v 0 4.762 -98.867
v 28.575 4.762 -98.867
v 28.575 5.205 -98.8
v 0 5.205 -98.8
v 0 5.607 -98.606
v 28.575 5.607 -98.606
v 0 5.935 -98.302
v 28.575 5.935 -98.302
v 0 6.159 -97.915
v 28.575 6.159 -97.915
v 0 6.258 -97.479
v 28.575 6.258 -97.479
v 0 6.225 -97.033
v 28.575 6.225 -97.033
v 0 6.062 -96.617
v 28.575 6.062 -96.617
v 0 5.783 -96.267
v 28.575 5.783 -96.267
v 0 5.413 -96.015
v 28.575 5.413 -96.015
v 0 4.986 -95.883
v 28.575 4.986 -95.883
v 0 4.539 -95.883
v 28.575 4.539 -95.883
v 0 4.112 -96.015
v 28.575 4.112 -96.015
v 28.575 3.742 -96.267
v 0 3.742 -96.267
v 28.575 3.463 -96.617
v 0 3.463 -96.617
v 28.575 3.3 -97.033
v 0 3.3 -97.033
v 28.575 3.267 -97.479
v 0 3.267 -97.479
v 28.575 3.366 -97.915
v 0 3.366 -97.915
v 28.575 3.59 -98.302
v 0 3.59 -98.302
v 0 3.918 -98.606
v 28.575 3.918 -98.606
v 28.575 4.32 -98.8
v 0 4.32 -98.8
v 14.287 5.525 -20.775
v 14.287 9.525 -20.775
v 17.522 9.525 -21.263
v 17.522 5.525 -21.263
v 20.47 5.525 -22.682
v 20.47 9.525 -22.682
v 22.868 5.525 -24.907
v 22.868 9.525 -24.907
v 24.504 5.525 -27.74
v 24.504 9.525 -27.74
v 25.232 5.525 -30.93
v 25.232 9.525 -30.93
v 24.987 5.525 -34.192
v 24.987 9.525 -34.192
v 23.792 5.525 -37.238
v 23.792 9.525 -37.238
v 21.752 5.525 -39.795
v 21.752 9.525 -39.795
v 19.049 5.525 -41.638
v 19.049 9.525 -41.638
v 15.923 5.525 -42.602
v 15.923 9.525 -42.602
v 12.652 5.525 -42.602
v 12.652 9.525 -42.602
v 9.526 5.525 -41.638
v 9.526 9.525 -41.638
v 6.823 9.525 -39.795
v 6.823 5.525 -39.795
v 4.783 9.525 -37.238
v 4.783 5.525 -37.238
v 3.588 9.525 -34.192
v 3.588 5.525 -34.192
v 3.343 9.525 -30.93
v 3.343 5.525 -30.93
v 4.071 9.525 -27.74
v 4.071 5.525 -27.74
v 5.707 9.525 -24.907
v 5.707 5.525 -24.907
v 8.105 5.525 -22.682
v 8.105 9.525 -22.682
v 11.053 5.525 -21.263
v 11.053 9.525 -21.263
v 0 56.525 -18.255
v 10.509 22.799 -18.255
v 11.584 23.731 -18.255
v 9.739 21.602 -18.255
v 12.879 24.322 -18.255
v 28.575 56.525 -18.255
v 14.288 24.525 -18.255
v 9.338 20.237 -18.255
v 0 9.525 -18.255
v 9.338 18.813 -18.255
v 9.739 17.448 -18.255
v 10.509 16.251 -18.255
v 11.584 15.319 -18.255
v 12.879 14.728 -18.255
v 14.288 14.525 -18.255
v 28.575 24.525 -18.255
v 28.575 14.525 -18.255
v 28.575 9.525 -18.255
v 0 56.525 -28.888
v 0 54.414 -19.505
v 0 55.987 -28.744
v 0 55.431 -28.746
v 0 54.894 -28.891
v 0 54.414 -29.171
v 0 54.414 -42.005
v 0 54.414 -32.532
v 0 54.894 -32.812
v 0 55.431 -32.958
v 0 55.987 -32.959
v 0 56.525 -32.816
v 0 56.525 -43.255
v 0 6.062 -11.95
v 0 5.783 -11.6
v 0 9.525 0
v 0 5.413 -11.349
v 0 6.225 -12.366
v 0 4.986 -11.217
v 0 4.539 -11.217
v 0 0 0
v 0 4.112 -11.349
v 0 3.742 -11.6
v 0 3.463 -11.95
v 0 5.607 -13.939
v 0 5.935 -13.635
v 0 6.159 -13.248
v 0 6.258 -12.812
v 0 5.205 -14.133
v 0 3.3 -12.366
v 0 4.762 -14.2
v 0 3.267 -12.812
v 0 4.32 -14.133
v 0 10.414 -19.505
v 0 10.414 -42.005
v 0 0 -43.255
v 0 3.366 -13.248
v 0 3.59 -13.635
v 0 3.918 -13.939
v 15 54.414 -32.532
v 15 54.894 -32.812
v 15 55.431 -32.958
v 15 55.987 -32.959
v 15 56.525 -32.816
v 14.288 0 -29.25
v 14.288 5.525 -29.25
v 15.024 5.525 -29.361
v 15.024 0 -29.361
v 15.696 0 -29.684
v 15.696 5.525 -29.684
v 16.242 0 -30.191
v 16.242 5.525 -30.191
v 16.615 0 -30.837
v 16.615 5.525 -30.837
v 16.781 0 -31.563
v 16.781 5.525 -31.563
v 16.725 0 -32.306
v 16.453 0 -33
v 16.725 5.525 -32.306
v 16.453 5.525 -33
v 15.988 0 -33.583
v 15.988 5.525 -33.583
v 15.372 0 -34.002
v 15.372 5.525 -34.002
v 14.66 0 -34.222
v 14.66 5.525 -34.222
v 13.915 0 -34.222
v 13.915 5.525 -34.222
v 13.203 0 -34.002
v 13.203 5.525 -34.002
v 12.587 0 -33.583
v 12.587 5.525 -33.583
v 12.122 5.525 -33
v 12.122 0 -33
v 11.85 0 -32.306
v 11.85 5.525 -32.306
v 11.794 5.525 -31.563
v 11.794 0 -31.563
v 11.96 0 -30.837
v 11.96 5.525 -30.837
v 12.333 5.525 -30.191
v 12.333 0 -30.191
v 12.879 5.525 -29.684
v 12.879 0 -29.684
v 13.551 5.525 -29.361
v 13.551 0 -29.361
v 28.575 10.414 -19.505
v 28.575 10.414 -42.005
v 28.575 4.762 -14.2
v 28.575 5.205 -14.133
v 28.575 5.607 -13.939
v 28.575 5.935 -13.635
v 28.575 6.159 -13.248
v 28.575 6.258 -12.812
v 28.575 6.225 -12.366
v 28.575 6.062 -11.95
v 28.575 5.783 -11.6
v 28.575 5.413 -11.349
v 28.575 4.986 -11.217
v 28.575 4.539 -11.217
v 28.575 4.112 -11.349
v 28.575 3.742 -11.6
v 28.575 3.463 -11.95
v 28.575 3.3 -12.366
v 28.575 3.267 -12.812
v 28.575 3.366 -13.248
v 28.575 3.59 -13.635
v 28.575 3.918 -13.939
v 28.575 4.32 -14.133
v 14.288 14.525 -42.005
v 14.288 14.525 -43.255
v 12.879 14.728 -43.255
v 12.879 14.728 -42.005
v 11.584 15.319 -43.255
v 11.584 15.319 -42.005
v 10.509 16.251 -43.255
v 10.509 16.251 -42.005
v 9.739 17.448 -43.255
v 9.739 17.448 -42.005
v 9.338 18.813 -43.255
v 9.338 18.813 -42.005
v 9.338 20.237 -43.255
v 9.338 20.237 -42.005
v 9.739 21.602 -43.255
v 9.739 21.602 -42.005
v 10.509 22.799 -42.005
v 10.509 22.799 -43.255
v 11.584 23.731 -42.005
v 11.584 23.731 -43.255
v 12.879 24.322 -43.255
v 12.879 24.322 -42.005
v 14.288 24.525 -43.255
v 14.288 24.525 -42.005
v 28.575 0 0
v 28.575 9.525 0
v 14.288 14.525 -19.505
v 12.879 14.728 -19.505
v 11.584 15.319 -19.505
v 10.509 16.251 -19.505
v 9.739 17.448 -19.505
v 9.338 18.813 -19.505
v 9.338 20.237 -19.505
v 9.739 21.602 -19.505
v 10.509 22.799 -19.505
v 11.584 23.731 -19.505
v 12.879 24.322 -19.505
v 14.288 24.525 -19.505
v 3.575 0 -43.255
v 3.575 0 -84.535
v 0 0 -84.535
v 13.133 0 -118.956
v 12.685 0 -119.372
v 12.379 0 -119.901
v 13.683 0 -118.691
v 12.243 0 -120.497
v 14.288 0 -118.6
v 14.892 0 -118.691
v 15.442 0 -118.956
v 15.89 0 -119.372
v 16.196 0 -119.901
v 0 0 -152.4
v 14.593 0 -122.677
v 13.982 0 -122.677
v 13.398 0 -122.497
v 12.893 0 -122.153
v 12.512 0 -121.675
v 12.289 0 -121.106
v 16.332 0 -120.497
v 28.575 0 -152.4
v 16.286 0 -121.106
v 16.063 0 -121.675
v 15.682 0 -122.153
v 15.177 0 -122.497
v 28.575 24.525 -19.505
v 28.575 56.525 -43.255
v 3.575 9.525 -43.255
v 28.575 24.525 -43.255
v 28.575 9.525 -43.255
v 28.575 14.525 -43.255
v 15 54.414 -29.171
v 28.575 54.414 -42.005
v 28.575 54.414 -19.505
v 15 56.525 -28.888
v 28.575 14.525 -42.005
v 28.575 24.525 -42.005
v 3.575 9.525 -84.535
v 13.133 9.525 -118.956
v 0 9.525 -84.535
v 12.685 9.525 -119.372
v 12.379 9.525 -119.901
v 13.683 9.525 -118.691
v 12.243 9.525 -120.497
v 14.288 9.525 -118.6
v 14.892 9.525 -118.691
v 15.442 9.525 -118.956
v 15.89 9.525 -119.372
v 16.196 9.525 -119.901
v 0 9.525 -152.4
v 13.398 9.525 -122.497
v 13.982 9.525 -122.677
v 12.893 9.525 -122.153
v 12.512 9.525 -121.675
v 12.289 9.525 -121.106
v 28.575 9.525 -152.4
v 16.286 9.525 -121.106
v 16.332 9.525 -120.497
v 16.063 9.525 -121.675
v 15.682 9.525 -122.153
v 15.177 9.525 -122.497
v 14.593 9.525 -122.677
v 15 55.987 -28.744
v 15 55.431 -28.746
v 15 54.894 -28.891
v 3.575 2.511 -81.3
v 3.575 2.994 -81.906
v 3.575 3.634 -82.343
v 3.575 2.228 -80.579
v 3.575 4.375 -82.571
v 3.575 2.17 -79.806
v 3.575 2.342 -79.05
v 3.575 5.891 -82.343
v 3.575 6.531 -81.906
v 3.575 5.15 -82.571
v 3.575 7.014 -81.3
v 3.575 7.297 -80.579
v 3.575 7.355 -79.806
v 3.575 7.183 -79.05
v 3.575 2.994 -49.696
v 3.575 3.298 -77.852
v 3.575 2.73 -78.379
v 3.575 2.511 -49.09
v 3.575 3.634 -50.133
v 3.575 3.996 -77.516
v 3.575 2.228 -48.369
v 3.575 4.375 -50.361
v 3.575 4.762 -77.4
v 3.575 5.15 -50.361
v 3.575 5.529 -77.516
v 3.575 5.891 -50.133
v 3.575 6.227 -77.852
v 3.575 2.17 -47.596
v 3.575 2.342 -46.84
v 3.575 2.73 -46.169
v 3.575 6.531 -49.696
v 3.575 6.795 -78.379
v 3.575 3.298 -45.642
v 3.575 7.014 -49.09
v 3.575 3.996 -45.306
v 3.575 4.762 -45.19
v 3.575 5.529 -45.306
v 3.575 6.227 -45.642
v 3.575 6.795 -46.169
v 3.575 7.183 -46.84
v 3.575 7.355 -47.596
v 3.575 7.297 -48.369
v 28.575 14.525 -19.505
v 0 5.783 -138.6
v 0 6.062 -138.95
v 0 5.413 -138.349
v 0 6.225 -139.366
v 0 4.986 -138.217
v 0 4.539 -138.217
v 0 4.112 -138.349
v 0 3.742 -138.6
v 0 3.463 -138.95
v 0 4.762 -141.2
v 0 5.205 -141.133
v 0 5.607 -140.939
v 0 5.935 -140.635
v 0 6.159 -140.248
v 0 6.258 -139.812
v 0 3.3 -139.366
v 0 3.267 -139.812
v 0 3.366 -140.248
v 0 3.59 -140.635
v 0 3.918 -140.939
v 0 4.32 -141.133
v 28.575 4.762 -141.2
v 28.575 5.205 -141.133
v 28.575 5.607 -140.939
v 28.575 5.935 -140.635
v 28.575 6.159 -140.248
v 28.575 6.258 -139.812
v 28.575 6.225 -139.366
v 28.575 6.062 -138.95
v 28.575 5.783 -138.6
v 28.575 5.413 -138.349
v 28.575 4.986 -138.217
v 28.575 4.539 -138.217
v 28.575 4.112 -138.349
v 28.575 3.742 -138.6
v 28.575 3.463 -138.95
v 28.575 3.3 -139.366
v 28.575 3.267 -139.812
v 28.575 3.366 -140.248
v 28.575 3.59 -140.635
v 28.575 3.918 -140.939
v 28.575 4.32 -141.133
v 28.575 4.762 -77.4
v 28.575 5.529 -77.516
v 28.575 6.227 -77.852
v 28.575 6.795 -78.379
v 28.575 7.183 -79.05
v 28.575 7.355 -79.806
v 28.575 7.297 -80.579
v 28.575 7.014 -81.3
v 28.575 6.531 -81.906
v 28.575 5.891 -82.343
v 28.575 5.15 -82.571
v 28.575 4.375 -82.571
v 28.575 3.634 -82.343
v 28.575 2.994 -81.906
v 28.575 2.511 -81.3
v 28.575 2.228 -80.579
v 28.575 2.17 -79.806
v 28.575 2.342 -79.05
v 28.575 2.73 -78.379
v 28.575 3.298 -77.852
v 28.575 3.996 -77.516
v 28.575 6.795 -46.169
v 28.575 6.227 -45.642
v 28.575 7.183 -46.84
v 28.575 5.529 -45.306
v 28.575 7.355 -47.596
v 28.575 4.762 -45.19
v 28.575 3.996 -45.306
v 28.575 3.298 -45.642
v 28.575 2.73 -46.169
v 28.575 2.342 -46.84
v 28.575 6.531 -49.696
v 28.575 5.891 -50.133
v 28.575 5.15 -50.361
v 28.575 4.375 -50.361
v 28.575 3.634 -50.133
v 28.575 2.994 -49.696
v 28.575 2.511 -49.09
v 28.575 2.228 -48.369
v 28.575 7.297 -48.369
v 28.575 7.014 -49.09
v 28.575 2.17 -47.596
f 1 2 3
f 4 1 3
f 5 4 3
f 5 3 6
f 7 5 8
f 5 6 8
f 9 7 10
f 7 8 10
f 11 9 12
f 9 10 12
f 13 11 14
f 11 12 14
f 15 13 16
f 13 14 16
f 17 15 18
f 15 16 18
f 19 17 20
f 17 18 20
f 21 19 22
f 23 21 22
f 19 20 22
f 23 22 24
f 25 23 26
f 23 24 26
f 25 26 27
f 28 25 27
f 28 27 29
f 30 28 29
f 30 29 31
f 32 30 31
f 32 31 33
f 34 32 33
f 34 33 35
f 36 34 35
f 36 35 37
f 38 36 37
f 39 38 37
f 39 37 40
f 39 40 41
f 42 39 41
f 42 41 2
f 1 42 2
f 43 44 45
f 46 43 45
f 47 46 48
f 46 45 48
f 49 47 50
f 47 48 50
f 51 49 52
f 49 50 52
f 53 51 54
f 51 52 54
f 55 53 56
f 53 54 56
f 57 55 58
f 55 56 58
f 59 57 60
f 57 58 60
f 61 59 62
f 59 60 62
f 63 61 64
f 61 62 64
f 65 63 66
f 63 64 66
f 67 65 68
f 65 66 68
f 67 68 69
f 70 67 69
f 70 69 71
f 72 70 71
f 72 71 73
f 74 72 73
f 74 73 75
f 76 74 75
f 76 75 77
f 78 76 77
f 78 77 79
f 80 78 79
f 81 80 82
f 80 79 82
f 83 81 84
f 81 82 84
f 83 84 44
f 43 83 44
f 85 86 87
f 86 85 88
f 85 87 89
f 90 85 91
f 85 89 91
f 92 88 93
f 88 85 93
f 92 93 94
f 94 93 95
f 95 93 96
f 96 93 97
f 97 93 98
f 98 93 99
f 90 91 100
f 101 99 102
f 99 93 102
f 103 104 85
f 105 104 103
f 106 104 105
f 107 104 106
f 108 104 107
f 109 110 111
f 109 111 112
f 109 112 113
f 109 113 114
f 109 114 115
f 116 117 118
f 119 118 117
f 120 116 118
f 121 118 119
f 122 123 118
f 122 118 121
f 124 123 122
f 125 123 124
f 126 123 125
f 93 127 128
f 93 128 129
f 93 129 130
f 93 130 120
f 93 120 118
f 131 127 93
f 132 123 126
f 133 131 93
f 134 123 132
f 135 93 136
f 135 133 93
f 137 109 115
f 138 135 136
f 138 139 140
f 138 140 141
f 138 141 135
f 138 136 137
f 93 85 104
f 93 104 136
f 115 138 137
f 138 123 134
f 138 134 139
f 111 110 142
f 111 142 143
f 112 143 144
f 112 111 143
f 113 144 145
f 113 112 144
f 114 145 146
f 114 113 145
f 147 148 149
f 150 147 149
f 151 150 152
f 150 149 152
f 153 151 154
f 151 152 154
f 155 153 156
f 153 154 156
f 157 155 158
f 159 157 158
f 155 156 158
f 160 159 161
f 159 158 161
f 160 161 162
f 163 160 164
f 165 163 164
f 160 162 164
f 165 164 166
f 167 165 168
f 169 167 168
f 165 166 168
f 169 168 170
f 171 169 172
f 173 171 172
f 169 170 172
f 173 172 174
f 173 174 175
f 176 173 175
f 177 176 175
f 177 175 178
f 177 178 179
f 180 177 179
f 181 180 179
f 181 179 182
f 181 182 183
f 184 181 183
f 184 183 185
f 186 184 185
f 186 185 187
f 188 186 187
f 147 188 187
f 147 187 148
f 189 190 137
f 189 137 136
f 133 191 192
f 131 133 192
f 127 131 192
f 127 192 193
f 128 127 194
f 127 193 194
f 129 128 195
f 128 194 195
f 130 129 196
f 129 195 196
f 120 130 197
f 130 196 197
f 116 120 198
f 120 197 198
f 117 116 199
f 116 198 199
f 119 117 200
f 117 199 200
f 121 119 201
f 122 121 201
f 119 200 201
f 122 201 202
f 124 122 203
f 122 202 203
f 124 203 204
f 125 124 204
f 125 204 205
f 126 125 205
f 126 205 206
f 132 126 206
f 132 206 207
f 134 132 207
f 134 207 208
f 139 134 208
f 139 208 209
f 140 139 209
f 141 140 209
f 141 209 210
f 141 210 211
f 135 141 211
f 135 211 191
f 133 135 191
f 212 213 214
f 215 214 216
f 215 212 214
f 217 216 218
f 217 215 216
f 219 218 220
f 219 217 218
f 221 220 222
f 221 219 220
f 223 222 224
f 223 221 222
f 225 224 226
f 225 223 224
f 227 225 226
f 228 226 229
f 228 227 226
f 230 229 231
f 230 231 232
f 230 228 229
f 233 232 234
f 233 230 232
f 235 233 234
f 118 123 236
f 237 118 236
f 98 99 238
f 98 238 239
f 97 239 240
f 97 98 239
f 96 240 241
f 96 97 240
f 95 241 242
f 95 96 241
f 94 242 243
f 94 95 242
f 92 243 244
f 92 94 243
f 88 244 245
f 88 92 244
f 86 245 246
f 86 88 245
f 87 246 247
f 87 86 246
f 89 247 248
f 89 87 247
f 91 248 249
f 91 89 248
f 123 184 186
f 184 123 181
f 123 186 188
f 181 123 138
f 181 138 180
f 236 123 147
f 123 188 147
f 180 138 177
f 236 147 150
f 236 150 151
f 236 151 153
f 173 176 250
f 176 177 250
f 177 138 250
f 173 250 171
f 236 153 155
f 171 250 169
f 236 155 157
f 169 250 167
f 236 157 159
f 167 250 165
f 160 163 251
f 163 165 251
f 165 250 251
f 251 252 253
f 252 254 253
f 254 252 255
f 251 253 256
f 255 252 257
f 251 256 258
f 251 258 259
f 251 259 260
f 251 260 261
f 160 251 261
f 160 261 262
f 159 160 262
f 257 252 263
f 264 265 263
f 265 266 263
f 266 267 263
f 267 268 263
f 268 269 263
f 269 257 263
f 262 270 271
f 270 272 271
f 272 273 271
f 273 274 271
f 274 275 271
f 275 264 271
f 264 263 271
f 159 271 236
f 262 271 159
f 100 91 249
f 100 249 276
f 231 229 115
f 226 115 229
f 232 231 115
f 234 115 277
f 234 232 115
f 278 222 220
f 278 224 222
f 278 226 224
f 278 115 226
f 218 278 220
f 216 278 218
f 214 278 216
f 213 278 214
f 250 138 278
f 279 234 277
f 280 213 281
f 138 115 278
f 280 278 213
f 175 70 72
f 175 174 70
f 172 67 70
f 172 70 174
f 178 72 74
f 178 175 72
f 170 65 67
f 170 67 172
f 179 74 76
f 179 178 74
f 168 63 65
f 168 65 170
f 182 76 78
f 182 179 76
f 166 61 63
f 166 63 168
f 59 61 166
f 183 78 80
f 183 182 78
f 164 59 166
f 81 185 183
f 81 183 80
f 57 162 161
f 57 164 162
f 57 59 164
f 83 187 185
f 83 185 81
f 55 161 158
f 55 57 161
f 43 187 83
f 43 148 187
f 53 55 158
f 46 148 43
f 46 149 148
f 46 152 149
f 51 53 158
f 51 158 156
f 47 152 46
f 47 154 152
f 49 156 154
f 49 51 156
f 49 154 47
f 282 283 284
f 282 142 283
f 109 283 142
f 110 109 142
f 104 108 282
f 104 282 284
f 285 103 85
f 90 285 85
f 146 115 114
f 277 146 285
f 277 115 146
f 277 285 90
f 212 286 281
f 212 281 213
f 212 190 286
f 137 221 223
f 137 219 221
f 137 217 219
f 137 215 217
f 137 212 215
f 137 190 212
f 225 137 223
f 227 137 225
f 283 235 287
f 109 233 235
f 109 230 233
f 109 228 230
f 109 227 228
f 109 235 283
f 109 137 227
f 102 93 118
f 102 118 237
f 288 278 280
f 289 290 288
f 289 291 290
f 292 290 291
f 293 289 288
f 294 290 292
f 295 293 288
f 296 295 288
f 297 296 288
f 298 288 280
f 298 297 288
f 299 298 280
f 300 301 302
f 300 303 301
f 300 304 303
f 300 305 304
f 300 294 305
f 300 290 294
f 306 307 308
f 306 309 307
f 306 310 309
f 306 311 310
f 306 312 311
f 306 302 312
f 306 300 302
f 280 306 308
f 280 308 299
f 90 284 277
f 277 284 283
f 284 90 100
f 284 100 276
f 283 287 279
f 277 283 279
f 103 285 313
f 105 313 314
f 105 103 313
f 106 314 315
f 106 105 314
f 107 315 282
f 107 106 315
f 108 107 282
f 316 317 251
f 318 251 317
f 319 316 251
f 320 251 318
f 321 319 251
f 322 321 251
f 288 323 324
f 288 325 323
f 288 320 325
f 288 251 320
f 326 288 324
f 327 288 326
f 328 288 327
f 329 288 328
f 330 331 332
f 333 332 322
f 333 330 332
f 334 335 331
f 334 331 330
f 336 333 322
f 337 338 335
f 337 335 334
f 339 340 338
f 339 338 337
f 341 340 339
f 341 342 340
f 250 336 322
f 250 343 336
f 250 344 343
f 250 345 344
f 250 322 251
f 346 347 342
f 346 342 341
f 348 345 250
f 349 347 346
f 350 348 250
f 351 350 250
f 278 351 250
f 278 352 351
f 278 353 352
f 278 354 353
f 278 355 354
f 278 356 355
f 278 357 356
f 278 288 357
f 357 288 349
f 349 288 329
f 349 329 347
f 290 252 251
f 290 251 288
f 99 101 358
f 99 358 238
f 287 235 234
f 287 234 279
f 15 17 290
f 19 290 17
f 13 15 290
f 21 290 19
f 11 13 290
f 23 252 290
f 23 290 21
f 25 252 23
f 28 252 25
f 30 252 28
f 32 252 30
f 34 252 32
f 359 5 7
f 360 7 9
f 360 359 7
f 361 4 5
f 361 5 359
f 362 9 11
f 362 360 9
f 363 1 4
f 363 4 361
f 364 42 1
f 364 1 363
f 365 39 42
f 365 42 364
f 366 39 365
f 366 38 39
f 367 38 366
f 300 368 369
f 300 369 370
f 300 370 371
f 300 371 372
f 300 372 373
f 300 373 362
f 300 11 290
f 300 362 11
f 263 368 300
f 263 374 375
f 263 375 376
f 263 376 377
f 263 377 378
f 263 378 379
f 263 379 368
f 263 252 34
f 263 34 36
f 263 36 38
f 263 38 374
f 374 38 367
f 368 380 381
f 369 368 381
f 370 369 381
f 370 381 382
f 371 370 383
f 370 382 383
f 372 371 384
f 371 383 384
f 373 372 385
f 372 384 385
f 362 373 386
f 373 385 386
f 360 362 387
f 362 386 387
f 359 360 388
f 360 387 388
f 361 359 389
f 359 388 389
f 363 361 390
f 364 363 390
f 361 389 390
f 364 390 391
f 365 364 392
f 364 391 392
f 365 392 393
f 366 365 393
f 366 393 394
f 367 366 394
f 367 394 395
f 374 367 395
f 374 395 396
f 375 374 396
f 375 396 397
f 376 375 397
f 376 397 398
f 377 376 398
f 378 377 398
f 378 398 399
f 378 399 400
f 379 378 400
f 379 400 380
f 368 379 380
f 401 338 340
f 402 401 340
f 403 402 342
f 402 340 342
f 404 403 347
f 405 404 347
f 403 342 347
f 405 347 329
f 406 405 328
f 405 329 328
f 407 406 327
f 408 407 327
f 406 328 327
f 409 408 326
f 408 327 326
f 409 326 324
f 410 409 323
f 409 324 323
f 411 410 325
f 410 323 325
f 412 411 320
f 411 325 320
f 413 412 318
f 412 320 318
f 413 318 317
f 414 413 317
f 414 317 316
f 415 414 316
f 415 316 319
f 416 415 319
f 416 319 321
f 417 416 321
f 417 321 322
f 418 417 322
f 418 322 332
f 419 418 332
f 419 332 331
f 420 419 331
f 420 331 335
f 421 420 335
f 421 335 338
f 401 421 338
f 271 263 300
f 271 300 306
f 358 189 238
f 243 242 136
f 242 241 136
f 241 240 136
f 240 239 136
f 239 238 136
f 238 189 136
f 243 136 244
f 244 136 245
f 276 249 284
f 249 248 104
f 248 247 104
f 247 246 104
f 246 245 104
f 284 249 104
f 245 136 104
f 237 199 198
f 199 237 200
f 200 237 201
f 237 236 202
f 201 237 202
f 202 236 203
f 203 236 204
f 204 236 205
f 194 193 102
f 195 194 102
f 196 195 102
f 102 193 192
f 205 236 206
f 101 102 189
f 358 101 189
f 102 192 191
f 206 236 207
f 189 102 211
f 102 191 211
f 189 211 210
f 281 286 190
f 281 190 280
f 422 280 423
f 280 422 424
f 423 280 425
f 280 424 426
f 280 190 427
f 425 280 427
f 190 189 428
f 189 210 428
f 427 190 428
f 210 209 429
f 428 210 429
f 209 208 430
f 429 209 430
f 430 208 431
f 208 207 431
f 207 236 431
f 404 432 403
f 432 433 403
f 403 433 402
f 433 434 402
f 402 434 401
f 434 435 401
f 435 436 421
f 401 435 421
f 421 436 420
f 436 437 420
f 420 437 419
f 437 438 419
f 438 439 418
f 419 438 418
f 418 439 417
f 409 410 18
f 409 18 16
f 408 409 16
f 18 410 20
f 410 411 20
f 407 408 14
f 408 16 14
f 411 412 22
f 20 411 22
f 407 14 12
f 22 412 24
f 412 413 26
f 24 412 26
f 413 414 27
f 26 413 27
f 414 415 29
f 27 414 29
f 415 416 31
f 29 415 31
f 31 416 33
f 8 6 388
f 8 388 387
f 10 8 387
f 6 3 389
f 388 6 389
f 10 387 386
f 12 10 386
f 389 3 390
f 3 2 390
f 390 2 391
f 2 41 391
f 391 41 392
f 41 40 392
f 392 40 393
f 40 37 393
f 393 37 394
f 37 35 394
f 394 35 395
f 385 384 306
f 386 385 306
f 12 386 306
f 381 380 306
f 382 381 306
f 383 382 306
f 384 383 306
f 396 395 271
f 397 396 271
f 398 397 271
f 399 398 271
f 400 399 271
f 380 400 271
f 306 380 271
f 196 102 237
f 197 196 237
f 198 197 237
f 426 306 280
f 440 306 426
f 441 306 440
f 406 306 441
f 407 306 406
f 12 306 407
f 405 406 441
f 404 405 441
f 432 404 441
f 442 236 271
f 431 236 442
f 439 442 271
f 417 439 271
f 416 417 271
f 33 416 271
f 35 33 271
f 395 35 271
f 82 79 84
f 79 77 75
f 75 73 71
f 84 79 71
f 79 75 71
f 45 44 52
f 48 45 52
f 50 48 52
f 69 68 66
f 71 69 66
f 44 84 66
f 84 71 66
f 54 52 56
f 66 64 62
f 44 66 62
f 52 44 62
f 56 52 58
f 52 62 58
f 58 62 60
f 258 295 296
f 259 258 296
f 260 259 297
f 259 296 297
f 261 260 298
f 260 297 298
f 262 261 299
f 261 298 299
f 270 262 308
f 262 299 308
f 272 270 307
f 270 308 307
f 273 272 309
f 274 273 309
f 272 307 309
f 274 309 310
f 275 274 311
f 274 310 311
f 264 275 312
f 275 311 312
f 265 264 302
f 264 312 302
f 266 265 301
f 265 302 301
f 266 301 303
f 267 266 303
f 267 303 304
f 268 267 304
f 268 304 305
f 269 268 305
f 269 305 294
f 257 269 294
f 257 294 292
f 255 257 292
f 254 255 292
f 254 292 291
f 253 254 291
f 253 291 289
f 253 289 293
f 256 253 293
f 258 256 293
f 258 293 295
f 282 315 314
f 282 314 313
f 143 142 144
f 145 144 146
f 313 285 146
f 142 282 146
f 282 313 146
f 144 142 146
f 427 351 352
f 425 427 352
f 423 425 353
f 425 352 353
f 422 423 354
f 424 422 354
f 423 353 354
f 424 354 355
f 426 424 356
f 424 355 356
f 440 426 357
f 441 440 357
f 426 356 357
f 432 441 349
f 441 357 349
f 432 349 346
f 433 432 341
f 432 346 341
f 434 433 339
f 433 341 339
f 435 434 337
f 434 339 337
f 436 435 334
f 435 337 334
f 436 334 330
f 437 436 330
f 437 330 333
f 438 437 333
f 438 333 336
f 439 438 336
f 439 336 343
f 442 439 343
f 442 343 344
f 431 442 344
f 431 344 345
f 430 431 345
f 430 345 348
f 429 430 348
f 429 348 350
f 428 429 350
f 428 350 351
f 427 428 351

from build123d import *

# Parameters (mm, degrees)
SKETCH2_W             = 28.575
SKETCH2_H             = 152.4
BOSS_EXTRUDE1_DEPTH   = 9.525
F_3_0MM_DOWEL_HOLE1_D = 3
LPATTERN1_COUNT       = 4
LPATTERN1_PITCH       = 42.333333333
SKETCH12_R            = 2.05
CUT_EXTRUDE1_DEPTH    = 156.348048749
SKETCH12_4_R          = 10.975
CUT_EXTRUDE2_DEPTH    = 4
SKETCH15_R            = 2.5
CUT_EXTRUDE3_DEPTH    = 156.154169296
SKETCH13_R            = 2.6
CUT_EXTRUDE4_DEPTH    = 156.348048749
SKETCH17_W            = 41.28
SKETCH17_H            = 9.525
CUT_EXTRUDE5_DEPTH    = 3.575
SKETCH18_W            = 28.575
SKETCH18_H            = 25
BOSS_EXTRUDE3_DEPTH   = 47
CUT_EXTRUDE12_REACH   = 167.037
SKETCH19_W            = 22.5
SKETCH19_H            = 44
CUT_EXTRUDE18_DEPTH   = 15
CUT_EXTRUDE17_DEPTH   = 25


with BuildPart() as part:
    # Sketch2 → Boss-Extrude1 (new body)
    with BuildSketch(Plane(origin=(0, 0, 0), x_dir=(1, 0, 0), z_dir=(0, 1, 0))):
        with Locations((14.2875, 76.2)):
            Rectangle(SKETCH2_W, SKETCH2_H)
    extrude(amount=BOSS_EXTRUDE1_DEPTH)

    # Ø3.0mm Dowel Hole1 (through all)
    with Locations(Plane.ZY):
        with Locations((-139.7, 4.7625)):
            f_3_0mm_dowel_hole1 = Hole(F_3_0MM_DOWEL_HOLE1_D / 2)

    # LPattern1: Ø3.0mm Dowel Hole1 ×4, 1 skipped
    with Locations(*[(0, 0, i * LPATTERN1_PITCH) for i in range(1, LPATTERN1_COUNT) if i not in (2,)]):
        add(f_3_0mm_dowel_hole1, mode=Mode.SUBTRACT)

    # Sketch12 → Cut-Extrude1 (cut, through all)
    with BuildSketch(Plane(origin=(0, 9.525, 0), x_dir=(1, 0, 0), z_dir=(0, 1, 0))):
        with Locations(Location((14.2875, 120.65, 0), (0, 0, 270))):
            Circle(SKETCH12_R)
    extrude(amount=-CUT_EXTRUDE1_DEPTH, mode=Mode.SUBTRACT)

    # Sketch12<4> → Cut-Extrude2 (cut)
    with BuildSketch(Plane(origin=(0, 9.525, 0), x_dir=(1, 0, 0), z_dir=(0, 1, 0))):
        with Locations(Location((14.2875, 31.75, 0), (0, 0, 270))):
            Circle(SKETCH12_4_R)
    extrude(amount=-CUT_EXTRUDE2_DEPTH, mode=Mode.SUBTRACT)

    # Sketch15 → Cut-Extrude3 (cut, through all)
    with BuildSketch(Plane(origin=(0, 5.525, 0), x_dir=(1, 0, 0), z_dir=(0, 1, 0))):
        with Locations(Location((14.2875, 31.75, 0), (0, 0, 270))):
            Circle(SKETCH15_R)
    extrude(amount=-CUT_EXTRUDE3_DEPTH, mode=Mode.SUBTRACT)

    # Sketch13 → Cut-Extrude4 (cut, through all)
    with BuildSketch(Plane.ZY):
        with Locations((-80, 4.7625)):
            Circle(SKETCH13_R)
        with Locations((-47.79, 4.7625)):
            Circle(SKETCH13_R)
    extrude(amount=-CUT_EXTRUDE4_DEPTH, mode=Mode.SUBTRACT)

    # Sketch17 → Cut-Extrude5 (cut)
    with BuildSketch(Plane.ZY):
        with Locations((-63.895, 4.7625)):
            Rectangle(SKETCH17_W, SKETCH17_H)
    extrude(amount=-CUT_EXTRUDE5_DEPTH, mode=Mode.SUBTRACT)

    # Sketch18 → Boss-Extrude3 (add)
    with BuildSketch(Plane(origin=(0, 9.525, 0), x_dir=(1, 0, 0), z_dir=(0, 1, 0))):
        with Locations((14.2875, 30.755)):
            Rectangle(SKETCH18_W, SKETCH18_H)
    extrude(amount=BOSS_EXTRUDE3_DEPTH)

    # Sketch19 → Cut-Extrude12 (cut, up to next)
    with BuildSketch(Plane.ZY, mode=Mode.PRIVATE) as cut_extrude12_sk1:
        with Locations((-30.755, 32.413500749)):
            Rectangle(SKETCH19_W, SKETCH19_H)
    cut_extrude12_tool1 = extrude(cut_extrude12_sk1.sketch, amount=-CUT_EXTRUDE12_REACH, mode=Mode.PRIVATE) & part.part
    add(cut_extrude12_tool1.solids().sort_by_distance((0, 32.413501, -30.755))[0], mode=Mode.SUBTRACT)

    # Sketch20 → Cut-Extrude18 (cut)
    with BuildSketch(Plane.ZY):
        with BuildLine():
            Line((-32.81559427, 56.525), (-28.887718849, 56.525))
            ThreePointArc((-28.887718849, 56.525), (-30.851656559, 53.588833805), (-32.81559427, 56.525))
        make_face()
    extrude(amount=-CUT_EXTRUDE18_DEPTH, mode=Mode.SUBTRACT)

    # Sketch21 → Cut-Extrude17 (cut)
    with BuildSketch(Plane.XY.offset(-18.255)):
        with BuildLine():
            Line((14.2875, 24.525), (28.575, 24.525))
            Line((28.575, 24.525), (28.575, 14.525))
            Line((28.575, 14.525), (14.2875, 14.525))
            ThreePointArc((14.2875, 14.525), (9.2875, 19.525), (14.2875, 24.525))
        make_face()
    extrude(amount=-CUT_EXTRUDE17_DEPTH, mode=Mode.SUBTRACT)


solid = part.part
